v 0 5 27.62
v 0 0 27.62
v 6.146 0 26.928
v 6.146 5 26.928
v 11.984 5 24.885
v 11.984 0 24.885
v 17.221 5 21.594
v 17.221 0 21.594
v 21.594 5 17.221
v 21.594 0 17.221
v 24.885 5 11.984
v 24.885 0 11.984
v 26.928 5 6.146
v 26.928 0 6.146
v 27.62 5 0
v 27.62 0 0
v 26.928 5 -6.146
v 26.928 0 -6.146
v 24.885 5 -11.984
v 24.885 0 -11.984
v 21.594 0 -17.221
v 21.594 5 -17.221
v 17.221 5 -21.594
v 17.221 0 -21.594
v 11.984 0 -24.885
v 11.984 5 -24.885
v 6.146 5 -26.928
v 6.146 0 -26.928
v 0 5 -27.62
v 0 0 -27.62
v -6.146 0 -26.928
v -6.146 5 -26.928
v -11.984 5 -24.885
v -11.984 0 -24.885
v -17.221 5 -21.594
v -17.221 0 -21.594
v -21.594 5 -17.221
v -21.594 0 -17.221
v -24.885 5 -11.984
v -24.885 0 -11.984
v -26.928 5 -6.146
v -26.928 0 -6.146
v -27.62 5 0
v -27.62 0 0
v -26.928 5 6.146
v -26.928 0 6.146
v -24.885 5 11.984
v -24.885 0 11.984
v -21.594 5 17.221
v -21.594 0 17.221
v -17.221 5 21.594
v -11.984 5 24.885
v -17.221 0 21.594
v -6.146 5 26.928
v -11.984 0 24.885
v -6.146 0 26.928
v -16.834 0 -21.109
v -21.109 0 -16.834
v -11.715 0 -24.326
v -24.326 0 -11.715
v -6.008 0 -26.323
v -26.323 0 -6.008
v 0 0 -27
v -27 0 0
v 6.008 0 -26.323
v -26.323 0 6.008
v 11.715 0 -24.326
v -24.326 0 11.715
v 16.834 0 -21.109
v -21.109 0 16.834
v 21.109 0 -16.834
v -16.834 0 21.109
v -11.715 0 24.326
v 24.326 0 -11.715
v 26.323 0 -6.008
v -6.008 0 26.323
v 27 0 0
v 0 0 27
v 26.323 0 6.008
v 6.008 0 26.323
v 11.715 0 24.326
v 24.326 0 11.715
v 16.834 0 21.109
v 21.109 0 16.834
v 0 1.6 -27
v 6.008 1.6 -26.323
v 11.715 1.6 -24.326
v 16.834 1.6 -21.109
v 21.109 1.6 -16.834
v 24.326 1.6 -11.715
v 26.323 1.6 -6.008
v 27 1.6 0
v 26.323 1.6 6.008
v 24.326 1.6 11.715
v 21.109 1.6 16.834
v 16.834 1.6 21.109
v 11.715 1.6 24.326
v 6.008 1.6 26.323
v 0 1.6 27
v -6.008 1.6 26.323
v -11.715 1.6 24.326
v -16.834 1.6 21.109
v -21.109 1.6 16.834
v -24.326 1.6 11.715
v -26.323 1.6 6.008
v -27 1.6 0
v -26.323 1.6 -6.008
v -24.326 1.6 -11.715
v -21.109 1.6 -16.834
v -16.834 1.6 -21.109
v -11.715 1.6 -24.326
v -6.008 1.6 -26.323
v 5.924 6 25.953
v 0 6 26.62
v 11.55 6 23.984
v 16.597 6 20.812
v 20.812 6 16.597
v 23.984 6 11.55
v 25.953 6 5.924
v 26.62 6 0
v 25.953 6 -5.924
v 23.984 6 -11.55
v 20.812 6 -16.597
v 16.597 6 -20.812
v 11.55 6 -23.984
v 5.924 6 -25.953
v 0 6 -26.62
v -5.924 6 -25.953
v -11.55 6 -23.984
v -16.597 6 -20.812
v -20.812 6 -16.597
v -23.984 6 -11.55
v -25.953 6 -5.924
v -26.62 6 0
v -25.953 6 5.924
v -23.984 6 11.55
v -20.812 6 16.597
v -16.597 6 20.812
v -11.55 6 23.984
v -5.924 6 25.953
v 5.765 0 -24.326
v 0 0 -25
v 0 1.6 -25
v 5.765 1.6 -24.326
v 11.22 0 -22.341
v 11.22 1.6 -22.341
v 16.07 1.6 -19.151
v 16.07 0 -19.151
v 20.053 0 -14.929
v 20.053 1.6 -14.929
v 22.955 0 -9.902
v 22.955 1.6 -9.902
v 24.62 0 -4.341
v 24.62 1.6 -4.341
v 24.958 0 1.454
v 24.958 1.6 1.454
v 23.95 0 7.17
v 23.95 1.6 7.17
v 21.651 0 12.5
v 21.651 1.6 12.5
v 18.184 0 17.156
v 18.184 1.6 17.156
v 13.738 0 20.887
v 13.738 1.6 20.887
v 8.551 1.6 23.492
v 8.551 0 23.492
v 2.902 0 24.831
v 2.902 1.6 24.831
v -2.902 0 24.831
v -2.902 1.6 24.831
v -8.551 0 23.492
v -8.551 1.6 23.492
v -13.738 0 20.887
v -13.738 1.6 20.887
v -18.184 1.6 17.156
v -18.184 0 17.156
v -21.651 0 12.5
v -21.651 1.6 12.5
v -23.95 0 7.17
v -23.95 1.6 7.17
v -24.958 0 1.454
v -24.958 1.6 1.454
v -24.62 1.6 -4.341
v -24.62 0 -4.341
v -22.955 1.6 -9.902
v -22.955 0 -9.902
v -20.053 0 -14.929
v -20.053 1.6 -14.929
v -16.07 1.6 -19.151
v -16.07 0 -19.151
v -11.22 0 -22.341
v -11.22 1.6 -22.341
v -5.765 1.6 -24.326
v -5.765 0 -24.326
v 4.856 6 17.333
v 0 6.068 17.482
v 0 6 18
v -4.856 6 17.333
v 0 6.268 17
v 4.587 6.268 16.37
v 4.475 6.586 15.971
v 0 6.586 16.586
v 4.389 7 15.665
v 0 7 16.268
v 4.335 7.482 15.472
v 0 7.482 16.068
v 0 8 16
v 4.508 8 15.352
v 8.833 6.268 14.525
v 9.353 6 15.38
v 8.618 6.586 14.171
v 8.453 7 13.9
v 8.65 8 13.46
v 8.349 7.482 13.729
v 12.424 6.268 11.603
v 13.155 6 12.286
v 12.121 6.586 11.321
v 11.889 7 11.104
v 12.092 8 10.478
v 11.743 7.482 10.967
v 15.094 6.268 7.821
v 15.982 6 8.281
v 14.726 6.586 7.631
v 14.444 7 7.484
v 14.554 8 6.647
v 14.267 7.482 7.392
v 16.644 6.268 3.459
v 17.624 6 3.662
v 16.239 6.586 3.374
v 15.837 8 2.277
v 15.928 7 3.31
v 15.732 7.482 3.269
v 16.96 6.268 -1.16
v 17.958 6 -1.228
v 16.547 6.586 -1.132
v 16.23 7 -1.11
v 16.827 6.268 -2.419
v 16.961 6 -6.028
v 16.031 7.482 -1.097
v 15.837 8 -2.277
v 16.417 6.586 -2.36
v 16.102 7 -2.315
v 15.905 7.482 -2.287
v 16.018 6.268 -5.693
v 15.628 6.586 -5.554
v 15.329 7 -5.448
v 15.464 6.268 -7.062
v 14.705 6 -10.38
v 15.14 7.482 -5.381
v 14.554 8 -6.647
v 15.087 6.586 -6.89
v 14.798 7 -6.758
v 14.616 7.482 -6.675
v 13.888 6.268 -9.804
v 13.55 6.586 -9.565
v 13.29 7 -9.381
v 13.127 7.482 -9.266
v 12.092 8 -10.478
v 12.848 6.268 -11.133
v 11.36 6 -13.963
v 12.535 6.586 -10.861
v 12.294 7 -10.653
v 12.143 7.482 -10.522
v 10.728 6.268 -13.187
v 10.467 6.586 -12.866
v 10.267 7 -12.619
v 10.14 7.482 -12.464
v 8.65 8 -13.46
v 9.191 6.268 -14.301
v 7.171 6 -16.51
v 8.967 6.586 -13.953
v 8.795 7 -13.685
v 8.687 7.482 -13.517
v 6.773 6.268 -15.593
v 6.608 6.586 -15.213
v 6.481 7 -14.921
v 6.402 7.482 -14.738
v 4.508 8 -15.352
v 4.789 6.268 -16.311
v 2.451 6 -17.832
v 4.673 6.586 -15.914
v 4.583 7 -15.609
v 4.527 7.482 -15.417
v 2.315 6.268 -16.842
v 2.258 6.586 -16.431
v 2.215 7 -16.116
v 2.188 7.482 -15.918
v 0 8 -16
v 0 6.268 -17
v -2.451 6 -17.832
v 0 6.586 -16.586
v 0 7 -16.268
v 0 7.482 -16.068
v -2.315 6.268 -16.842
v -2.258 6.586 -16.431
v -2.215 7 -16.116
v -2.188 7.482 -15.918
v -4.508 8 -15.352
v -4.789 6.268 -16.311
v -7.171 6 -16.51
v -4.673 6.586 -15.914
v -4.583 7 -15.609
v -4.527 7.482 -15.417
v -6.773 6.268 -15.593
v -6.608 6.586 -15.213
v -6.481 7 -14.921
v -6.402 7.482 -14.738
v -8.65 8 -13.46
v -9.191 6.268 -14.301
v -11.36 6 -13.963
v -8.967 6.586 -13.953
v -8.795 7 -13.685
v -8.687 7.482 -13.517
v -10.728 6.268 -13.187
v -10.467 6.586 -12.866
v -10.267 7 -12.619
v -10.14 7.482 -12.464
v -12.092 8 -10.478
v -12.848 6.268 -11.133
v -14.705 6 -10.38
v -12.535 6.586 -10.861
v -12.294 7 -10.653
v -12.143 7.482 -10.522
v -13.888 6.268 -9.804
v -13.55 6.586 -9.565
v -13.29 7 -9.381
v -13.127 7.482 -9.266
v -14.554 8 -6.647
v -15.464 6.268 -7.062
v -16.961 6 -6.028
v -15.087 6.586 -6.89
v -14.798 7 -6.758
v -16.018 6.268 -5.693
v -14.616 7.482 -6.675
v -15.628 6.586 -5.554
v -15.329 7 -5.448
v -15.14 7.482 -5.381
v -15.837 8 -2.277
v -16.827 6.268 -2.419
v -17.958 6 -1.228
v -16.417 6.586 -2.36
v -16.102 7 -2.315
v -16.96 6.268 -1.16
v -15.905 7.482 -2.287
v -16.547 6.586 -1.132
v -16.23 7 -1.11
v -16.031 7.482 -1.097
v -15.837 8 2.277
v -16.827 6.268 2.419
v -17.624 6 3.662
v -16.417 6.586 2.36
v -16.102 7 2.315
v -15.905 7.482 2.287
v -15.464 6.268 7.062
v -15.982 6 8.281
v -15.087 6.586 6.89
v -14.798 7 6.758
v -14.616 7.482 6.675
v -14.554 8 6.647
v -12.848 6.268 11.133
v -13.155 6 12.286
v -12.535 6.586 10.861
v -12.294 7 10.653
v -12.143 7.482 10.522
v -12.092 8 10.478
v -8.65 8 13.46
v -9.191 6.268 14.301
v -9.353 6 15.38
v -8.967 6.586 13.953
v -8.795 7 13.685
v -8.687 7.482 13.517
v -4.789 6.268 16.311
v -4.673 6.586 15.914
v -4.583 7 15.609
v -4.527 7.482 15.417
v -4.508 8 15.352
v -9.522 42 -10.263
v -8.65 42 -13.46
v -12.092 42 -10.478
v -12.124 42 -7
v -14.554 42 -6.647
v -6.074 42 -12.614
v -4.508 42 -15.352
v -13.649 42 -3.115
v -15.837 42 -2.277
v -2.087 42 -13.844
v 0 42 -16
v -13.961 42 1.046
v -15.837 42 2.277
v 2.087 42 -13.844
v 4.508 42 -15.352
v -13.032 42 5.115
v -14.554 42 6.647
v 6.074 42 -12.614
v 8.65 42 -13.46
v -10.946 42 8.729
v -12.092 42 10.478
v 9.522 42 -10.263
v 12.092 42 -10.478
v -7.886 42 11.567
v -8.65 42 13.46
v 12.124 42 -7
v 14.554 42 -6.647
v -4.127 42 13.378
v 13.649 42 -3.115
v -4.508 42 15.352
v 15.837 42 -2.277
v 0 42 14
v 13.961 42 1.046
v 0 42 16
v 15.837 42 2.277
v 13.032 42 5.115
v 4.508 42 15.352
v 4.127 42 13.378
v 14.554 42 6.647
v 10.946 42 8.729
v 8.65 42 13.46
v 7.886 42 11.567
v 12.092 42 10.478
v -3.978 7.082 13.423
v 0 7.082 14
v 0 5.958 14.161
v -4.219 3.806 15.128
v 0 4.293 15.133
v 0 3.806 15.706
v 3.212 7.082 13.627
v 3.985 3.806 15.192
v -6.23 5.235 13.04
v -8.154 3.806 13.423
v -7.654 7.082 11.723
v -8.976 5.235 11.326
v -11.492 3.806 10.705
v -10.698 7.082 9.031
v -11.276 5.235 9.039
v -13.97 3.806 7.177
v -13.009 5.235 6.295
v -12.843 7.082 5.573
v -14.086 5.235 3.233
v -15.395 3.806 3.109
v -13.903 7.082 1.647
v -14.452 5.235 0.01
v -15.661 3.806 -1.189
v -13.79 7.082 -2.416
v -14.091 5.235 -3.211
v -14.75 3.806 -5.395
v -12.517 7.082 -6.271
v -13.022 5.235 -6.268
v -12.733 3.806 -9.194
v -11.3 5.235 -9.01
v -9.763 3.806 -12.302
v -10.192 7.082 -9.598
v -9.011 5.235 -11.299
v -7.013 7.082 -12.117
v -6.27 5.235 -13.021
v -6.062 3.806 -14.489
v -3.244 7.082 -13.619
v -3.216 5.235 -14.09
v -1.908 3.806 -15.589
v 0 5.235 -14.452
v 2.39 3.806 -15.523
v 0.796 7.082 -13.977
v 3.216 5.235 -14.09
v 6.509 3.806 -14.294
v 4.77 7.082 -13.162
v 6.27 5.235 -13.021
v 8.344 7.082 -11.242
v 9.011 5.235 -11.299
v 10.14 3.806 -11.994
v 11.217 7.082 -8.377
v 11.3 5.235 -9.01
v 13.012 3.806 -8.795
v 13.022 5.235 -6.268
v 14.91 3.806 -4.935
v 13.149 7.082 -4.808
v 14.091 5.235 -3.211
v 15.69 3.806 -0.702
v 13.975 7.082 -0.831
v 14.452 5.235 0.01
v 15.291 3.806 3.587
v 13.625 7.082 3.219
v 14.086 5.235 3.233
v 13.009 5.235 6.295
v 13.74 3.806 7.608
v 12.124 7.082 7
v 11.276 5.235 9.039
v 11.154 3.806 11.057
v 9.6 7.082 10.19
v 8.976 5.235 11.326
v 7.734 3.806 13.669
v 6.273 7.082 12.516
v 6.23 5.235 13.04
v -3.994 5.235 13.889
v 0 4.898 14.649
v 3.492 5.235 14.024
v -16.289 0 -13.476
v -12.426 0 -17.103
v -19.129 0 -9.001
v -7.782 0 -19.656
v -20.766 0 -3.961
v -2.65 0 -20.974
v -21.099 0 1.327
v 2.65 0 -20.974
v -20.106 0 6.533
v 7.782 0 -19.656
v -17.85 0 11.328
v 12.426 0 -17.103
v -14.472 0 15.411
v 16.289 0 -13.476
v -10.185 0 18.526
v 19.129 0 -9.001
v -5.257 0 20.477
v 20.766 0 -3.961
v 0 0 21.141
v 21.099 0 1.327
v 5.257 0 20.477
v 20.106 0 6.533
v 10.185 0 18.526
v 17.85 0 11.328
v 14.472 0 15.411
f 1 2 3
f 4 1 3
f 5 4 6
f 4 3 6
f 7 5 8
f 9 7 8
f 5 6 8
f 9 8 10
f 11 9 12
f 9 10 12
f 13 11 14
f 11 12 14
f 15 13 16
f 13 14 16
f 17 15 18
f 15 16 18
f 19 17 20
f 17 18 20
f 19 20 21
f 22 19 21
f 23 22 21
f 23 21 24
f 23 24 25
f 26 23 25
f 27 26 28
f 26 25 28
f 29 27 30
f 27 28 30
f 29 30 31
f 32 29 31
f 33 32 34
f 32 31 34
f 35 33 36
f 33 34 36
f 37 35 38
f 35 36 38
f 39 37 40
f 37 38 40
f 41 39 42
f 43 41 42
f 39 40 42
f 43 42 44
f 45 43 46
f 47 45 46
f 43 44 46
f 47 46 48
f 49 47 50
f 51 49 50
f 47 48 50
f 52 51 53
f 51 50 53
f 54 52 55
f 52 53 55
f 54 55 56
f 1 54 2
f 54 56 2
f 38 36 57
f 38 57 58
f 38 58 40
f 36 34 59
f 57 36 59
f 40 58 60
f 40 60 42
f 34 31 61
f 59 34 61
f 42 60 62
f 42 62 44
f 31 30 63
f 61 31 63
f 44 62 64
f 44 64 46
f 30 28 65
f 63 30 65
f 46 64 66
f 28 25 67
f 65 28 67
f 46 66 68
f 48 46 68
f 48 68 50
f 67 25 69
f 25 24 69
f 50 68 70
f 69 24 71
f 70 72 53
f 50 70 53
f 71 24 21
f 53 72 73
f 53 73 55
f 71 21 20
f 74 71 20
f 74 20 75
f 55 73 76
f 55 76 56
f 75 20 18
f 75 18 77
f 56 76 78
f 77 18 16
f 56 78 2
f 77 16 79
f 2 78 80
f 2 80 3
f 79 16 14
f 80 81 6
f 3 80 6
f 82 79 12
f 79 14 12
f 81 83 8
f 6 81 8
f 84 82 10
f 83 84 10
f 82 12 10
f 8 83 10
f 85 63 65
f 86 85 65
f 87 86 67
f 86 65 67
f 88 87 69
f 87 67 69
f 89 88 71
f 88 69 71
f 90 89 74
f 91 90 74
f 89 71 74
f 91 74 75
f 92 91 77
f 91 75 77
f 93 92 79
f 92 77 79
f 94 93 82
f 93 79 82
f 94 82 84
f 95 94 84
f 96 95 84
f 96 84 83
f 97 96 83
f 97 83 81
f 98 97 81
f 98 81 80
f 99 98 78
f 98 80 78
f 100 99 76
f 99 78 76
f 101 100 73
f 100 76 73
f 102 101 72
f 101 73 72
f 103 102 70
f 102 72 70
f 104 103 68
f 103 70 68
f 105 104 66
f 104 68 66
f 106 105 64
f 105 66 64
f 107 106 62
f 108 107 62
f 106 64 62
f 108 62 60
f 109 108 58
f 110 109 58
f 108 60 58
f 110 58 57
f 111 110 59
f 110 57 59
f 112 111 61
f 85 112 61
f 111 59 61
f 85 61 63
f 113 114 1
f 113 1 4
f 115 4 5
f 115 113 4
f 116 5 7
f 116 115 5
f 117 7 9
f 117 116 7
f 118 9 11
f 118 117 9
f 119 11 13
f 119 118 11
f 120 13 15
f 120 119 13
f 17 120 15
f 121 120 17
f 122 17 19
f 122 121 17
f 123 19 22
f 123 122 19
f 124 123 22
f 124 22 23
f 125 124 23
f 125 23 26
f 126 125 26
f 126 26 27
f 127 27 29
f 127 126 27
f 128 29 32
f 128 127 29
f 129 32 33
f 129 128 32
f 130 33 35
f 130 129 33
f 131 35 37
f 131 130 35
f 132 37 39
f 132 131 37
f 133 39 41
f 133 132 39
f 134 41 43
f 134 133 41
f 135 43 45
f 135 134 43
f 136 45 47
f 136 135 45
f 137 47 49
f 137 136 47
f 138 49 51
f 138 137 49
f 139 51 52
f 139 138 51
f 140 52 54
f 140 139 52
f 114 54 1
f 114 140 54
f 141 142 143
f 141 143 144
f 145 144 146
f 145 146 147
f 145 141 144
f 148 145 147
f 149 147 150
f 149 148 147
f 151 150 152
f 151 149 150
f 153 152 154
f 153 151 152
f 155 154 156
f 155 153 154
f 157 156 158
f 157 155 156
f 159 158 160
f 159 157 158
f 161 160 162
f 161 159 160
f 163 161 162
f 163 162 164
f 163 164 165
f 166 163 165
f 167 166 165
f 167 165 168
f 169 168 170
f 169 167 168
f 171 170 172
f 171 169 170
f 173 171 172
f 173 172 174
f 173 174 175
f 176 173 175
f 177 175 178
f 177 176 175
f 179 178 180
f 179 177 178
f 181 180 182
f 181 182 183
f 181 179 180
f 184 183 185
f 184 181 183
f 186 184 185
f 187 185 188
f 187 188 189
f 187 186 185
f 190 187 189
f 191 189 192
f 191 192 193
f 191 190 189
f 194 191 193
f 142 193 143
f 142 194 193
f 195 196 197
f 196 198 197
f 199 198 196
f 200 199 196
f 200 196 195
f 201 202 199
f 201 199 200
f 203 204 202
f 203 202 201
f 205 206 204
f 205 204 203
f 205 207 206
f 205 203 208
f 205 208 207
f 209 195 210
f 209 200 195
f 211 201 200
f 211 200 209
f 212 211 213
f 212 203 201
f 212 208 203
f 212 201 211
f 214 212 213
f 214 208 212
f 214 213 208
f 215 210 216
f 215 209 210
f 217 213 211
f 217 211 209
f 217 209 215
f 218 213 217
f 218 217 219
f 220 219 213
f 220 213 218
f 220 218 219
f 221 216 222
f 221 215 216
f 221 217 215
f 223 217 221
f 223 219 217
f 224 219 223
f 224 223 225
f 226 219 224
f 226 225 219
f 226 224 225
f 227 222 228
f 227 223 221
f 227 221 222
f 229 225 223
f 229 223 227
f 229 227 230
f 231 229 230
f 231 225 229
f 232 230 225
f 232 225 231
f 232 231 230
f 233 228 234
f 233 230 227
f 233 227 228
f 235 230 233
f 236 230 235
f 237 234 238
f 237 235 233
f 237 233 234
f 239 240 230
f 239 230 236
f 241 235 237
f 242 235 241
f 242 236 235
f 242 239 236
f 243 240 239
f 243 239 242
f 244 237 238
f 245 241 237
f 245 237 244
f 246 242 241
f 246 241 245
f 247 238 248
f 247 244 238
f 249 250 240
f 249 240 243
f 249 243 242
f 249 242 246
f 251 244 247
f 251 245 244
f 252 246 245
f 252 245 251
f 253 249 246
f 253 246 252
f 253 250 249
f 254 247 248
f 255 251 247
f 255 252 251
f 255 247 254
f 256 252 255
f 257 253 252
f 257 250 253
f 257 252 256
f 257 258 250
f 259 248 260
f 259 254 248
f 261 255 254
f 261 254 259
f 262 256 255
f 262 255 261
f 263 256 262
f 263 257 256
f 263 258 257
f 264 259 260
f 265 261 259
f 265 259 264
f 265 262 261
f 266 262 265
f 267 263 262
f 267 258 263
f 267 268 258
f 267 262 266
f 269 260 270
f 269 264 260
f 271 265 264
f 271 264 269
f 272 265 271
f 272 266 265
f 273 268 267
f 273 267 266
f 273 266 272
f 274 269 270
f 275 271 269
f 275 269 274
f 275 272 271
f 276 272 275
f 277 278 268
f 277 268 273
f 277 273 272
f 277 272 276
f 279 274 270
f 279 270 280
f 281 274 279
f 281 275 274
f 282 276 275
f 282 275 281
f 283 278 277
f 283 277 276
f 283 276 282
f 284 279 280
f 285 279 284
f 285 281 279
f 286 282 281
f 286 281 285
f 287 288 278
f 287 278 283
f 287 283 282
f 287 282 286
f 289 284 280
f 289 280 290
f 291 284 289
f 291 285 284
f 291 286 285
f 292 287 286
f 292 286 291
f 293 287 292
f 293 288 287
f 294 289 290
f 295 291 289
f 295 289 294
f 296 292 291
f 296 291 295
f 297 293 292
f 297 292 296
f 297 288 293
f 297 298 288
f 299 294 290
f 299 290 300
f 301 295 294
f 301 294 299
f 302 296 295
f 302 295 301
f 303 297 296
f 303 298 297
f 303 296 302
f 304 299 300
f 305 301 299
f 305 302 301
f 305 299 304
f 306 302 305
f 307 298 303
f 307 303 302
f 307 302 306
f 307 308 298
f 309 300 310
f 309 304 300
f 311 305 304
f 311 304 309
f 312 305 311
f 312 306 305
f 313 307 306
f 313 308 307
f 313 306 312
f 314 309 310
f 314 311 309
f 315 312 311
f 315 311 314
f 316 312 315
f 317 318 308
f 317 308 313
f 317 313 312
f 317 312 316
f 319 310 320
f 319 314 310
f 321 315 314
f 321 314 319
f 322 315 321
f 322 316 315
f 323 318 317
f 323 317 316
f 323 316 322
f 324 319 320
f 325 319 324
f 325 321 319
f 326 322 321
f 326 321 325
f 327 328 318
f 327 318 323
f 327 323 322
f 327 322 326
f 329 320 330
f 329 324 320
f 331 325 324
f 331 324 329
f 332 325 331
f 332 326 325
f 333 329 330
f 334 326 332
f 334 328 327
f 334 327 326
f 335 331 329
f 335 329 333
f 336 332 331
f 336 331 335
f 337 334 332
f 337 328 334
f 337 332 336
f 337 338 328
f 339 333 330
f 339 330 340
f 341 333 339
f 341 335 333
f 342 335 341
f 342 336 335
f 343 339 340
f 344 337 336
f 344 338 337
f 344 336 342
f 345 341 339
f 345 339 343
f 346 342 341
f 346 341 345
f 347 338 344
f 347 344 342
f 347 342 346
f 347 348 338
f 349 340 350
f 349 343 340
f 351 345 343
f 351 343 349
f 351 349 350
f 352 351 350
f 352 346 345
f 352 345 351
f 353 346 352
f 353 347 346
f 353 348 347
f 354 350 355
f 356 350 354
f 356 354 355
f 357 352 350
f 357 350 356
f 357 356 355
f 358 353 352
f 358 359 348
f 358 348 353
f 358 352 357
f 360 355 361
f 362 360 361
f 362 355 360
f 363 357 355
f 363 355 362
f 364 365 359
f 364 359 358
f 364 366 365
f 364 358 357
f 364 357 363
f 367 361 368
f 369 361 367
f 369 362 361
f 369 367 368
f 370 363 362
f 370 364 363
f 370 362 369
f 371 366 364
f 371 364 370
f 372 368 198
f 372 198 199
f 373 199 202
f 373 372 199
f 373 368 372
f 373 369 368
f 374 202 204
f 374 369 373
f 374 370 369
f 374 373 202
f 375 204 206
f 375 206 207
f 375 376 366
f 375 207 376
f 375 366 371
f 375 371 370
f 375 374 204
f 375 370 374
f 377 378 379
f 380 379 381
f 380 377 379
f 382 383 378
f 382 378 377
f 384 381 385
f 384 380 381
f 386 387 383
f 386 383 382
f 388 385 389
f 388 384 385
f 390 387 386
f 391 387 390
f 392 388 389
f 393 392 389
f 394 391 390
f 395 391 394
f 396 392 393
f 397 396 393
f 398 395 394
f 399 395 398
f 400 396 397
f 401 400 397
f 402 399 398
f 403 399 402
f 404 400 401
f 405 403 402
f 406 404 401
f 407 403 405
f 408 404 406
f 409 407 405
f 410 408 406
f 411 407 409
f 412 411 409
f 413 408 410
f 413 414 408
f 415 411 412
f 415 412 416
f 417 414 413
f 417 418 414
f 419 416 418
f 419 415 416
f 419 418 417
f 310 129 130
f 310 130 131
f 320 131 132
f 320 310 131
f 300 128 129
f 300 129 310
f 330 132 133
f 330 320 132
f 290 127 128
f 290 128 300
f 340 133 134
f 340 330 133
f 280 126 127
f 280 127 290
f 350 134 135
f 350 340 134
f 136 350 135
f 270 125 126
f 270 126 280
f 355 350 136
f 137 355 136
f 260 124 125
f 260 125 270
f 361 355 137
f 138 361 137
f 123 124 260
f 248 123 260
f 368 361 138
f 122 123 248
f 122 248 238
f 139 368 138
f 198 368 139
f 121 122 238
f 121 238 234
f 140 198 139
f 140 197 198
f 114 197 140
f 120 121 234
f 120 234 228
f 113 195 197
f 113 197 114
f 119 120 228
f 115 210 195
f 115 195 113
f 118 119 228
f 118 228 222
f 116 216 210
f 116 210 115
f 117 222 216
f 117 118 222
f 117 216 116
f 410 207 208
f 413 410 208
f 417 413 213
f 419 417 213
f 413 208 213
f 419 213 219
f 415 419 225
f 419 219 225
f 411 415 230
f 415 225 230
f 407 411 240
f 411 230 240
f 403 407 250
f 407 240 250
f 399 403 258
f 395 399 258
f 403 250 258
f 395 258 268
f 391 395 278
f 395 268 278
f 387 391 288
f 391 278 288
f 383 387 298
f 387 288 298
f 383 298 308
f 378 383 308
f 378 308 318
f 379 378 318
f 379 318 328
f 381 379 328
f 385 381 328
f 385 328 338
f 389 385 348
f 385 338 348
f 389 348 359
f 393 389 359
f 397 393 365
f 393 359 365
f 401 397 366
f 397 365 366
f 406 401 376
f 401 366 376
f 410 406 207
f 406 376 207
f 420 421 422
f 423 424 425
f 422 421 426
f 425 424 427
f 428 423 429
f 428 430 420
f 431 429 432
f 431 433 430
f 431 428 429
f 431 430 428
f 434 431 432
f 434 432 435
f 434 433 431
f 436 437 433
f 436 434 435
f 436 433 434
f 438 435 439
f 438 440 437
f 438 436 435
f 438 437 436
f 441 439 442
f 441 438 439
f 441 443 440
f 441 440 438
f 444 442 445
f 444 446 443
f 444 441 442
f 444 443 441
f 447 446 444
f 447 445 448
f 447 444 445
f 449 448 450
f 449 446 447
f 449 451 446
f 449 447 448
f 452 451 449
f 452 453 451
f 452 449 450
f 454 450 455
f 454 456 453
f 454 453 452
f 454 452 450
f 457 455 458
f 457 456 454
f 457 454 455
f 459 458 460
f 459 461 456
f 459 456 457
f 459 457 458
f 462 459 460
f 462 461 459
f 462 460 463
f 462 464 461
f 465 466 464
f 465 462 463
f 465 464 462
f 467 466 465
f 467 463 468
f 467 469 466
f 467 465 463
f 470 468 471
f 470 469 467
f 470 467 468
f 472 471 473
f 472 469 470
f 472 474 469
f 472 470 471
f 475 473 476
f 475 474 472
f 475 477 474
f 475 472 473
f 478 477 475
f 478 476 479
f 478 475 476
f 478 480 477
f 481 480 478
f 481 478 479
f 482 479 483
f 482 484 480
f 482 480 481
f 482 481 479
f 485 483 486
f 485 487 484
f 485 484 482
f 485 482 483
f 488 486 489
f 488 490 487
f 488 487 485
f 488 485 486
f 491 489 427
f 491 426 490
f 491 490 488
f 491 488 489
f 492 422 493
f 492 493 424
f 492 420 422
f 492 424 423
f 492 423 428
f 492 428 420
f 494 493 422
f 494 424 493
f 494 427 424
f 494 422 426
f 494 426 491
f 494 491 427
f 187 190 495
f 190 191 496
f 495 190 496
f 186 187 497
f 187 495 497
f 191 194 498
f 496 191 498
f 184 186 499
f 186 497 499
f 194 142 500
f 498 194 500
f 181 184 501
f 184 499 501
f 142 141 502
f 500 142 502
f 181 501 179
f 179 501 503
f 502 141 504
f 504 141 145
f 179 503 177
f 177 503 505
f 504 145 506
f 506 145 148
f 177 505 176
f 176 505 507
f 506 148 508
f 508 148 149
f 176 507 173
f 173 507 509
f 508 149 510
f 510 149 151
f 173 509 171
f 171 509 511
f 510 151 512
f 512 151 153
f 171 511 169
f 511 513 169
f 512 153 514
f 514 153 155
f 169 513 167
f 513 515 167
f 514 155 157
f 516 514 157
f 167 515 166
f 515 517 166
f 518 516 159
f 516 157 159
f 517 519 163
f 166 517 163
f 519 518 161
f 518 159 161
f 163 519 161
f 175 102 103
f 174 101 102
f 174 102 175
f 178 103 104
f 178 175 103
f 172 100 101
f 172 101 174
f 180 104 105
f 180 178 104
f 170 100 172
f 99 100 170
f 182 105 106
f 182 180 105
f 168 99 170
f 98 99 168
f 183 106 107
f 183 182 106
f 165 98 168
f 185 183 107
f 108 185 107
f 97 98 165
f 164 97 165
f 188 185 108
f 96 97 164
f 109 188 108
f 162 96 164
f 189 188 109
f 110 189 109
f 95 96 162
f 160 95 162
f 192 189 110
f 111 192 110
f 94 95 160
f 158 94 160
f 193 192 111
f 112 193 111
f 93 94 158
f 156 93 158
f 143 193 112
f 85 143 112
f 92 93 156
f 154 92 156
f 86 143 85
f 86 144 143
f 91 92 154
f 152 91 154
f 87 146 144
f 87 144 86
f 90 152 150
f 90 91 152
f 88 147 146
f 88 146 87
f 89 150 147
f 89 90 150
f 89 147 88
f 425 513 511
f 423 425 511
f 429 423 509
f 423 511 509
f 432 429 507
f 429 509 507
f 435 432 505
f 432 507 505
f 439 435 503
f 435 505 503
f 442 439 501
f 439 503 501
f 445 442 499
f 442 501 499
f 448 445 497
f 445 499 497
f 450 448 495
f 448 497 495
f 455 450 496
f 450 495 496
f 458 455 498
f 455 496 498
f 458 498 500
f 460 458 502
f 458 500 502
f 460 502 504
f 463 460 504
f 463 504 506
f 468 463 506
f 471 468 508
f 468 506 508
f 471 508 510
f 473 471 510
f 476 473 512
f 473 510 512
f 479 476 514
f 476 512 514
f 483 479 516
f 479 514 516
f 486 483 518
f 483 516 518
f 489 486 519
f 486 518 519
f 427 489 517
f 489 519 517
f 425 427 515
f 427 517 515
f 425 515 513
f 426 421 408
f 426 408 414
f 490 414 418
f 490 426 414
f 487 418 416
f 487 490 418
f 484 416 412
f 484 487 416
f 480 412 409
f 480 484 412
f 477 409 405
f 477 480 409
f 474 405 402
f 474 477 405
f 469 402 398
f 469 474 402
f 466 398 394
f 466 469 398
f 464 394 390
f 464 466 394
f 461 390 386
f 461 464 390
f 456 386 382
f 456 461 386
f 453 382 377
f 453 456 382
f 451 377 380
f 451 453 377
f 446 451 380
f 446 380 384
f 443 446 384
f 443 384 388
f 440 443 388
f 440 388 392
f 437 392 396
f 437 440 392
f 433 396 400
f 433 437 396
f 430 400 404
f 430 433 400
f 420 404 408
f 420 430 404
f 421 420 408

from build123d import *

# Parameters (mm, degrees)
SKETCH1_R           = 27.62
BOSS_EXTRUDE1_DEPTH = 6
SKETCH2_R           = 16
SKETCH2_R_2         = 14
BOSS_EXTRUDE2_DEPTH = 36
CUT_EXTRUDE1_START  = -36
SKETCH3_R           = 14
CUT_EXTRUDE1_DEPTH  = 36
CHAMFER1_SIZE       = 5
CHAMFER1_SIZE2      = 7.140740034
CHAMFER2_SIZE       = 1
SKETCH4_R           = 27
SKETCH4_R_2         = 25
CUT_EXTRUDE2_DEPTH  = 1.6
FILLET1_R           = 2
FILLET2_R           = 4


with BuildPart() as part:
    # Sketch1 → Boss-Extrude1 (new body)
    with BuildSketch(Plane(origin=(0, 0, 0), x_dir=(1, 0, 0), z_dir=(0, 1, 0))):
        with Locations(Location((0, 0, 0), (0, 0, 270))):
            Circle(SKETCH1_R)
    extrude(amount=BOSS_EXTRUDE1_DEPTH)

    # Sketch2 → Boss-Extrude2 (add)
    with BuildSketch(Plane(origin=(0, 6, 0), x_dir=(1, 0, 0), z_dir=(0, 1, 0))):
        with Locations(Location((0, 0, 0), (0, 0, 270))):
            Circle(SKETCH2_R)
        with Locations(Location((0, 0, 0), (0, 0, 270))):
            Circle(SKETCH2_R_2, mode=Mode.SUBTRACT)
    extrude(amount=BOSS_EXTRUDE2_DEPTH)

    # Sketch3 → Cut-Extrude1 (cut)
    with BuildSketch(Plane(origin=(0, 6, 0), x_dir=(1, 0, 0), z_dir=(0, 1, 0)).offset(CUT_EXTRUDE1_START)):
        with Locations(Location((0, 0, 0), (0, 0, 270))):
            Circle(SKETCH3_R)
    extrude(amount=CUT_EXTRUDE1_DEPTH, mode=Mode.SUBTRACT)

    # Chamfer1
    chamfer1_edges = [part.edges().sort_by_distance(p)[0] for p in [
        (0, 0, -14),
    ]]
    chamfer1_side = [part.faces().sort_by_distance(p)[0] for p in [
        (0, 21, -14),
    ]]
    chamfer(chamfer1_edges, length=CHAMFER1_SIZE, length2=CHAMFER1_SIZE2, reference=chamfer1_side[0])

    # Chamfer2
    chamfer2_edges = [part.edges().sort_by_distance(p)[0] for p in [
        (0, 6, -27.62),
    ]]
    chamfer(chamfer2_edges, length=CHAMFER2_SIZE)

    # Sketch4 → Cut-Extrude2 (cut)
    with BuildSketch(Plane.XZ):
        with Locations(Location((0, 0, 0), (0, 0, 270))):
            Circle(SKETCH4_R)
        with Locations(Location((0, 0, 0), (0, 0, 270))):
            Circle(SKETCH4_R_2, mode=Mode.SUBTRACT)
    extrude(amount=-CUT_EXTRUDE2_DEPTH, mode=Mode.SUBTRACT)

    # Fillet1
    fillet1_edges = [part.edges().sort_by_distance(p)[0] for p in [
        (0, 6, -16),
    ]]
    fillet(fillet1_edges, radius=FILLET1_R)

    # Fillet2
    fillet2_edges = [part.edges().sort_by_distance(p)[0] for p in [
        (0, 5, -14),
    ]]
    fillet(fillet2_edges, radius=FILLET2_R)


solid = part.part
